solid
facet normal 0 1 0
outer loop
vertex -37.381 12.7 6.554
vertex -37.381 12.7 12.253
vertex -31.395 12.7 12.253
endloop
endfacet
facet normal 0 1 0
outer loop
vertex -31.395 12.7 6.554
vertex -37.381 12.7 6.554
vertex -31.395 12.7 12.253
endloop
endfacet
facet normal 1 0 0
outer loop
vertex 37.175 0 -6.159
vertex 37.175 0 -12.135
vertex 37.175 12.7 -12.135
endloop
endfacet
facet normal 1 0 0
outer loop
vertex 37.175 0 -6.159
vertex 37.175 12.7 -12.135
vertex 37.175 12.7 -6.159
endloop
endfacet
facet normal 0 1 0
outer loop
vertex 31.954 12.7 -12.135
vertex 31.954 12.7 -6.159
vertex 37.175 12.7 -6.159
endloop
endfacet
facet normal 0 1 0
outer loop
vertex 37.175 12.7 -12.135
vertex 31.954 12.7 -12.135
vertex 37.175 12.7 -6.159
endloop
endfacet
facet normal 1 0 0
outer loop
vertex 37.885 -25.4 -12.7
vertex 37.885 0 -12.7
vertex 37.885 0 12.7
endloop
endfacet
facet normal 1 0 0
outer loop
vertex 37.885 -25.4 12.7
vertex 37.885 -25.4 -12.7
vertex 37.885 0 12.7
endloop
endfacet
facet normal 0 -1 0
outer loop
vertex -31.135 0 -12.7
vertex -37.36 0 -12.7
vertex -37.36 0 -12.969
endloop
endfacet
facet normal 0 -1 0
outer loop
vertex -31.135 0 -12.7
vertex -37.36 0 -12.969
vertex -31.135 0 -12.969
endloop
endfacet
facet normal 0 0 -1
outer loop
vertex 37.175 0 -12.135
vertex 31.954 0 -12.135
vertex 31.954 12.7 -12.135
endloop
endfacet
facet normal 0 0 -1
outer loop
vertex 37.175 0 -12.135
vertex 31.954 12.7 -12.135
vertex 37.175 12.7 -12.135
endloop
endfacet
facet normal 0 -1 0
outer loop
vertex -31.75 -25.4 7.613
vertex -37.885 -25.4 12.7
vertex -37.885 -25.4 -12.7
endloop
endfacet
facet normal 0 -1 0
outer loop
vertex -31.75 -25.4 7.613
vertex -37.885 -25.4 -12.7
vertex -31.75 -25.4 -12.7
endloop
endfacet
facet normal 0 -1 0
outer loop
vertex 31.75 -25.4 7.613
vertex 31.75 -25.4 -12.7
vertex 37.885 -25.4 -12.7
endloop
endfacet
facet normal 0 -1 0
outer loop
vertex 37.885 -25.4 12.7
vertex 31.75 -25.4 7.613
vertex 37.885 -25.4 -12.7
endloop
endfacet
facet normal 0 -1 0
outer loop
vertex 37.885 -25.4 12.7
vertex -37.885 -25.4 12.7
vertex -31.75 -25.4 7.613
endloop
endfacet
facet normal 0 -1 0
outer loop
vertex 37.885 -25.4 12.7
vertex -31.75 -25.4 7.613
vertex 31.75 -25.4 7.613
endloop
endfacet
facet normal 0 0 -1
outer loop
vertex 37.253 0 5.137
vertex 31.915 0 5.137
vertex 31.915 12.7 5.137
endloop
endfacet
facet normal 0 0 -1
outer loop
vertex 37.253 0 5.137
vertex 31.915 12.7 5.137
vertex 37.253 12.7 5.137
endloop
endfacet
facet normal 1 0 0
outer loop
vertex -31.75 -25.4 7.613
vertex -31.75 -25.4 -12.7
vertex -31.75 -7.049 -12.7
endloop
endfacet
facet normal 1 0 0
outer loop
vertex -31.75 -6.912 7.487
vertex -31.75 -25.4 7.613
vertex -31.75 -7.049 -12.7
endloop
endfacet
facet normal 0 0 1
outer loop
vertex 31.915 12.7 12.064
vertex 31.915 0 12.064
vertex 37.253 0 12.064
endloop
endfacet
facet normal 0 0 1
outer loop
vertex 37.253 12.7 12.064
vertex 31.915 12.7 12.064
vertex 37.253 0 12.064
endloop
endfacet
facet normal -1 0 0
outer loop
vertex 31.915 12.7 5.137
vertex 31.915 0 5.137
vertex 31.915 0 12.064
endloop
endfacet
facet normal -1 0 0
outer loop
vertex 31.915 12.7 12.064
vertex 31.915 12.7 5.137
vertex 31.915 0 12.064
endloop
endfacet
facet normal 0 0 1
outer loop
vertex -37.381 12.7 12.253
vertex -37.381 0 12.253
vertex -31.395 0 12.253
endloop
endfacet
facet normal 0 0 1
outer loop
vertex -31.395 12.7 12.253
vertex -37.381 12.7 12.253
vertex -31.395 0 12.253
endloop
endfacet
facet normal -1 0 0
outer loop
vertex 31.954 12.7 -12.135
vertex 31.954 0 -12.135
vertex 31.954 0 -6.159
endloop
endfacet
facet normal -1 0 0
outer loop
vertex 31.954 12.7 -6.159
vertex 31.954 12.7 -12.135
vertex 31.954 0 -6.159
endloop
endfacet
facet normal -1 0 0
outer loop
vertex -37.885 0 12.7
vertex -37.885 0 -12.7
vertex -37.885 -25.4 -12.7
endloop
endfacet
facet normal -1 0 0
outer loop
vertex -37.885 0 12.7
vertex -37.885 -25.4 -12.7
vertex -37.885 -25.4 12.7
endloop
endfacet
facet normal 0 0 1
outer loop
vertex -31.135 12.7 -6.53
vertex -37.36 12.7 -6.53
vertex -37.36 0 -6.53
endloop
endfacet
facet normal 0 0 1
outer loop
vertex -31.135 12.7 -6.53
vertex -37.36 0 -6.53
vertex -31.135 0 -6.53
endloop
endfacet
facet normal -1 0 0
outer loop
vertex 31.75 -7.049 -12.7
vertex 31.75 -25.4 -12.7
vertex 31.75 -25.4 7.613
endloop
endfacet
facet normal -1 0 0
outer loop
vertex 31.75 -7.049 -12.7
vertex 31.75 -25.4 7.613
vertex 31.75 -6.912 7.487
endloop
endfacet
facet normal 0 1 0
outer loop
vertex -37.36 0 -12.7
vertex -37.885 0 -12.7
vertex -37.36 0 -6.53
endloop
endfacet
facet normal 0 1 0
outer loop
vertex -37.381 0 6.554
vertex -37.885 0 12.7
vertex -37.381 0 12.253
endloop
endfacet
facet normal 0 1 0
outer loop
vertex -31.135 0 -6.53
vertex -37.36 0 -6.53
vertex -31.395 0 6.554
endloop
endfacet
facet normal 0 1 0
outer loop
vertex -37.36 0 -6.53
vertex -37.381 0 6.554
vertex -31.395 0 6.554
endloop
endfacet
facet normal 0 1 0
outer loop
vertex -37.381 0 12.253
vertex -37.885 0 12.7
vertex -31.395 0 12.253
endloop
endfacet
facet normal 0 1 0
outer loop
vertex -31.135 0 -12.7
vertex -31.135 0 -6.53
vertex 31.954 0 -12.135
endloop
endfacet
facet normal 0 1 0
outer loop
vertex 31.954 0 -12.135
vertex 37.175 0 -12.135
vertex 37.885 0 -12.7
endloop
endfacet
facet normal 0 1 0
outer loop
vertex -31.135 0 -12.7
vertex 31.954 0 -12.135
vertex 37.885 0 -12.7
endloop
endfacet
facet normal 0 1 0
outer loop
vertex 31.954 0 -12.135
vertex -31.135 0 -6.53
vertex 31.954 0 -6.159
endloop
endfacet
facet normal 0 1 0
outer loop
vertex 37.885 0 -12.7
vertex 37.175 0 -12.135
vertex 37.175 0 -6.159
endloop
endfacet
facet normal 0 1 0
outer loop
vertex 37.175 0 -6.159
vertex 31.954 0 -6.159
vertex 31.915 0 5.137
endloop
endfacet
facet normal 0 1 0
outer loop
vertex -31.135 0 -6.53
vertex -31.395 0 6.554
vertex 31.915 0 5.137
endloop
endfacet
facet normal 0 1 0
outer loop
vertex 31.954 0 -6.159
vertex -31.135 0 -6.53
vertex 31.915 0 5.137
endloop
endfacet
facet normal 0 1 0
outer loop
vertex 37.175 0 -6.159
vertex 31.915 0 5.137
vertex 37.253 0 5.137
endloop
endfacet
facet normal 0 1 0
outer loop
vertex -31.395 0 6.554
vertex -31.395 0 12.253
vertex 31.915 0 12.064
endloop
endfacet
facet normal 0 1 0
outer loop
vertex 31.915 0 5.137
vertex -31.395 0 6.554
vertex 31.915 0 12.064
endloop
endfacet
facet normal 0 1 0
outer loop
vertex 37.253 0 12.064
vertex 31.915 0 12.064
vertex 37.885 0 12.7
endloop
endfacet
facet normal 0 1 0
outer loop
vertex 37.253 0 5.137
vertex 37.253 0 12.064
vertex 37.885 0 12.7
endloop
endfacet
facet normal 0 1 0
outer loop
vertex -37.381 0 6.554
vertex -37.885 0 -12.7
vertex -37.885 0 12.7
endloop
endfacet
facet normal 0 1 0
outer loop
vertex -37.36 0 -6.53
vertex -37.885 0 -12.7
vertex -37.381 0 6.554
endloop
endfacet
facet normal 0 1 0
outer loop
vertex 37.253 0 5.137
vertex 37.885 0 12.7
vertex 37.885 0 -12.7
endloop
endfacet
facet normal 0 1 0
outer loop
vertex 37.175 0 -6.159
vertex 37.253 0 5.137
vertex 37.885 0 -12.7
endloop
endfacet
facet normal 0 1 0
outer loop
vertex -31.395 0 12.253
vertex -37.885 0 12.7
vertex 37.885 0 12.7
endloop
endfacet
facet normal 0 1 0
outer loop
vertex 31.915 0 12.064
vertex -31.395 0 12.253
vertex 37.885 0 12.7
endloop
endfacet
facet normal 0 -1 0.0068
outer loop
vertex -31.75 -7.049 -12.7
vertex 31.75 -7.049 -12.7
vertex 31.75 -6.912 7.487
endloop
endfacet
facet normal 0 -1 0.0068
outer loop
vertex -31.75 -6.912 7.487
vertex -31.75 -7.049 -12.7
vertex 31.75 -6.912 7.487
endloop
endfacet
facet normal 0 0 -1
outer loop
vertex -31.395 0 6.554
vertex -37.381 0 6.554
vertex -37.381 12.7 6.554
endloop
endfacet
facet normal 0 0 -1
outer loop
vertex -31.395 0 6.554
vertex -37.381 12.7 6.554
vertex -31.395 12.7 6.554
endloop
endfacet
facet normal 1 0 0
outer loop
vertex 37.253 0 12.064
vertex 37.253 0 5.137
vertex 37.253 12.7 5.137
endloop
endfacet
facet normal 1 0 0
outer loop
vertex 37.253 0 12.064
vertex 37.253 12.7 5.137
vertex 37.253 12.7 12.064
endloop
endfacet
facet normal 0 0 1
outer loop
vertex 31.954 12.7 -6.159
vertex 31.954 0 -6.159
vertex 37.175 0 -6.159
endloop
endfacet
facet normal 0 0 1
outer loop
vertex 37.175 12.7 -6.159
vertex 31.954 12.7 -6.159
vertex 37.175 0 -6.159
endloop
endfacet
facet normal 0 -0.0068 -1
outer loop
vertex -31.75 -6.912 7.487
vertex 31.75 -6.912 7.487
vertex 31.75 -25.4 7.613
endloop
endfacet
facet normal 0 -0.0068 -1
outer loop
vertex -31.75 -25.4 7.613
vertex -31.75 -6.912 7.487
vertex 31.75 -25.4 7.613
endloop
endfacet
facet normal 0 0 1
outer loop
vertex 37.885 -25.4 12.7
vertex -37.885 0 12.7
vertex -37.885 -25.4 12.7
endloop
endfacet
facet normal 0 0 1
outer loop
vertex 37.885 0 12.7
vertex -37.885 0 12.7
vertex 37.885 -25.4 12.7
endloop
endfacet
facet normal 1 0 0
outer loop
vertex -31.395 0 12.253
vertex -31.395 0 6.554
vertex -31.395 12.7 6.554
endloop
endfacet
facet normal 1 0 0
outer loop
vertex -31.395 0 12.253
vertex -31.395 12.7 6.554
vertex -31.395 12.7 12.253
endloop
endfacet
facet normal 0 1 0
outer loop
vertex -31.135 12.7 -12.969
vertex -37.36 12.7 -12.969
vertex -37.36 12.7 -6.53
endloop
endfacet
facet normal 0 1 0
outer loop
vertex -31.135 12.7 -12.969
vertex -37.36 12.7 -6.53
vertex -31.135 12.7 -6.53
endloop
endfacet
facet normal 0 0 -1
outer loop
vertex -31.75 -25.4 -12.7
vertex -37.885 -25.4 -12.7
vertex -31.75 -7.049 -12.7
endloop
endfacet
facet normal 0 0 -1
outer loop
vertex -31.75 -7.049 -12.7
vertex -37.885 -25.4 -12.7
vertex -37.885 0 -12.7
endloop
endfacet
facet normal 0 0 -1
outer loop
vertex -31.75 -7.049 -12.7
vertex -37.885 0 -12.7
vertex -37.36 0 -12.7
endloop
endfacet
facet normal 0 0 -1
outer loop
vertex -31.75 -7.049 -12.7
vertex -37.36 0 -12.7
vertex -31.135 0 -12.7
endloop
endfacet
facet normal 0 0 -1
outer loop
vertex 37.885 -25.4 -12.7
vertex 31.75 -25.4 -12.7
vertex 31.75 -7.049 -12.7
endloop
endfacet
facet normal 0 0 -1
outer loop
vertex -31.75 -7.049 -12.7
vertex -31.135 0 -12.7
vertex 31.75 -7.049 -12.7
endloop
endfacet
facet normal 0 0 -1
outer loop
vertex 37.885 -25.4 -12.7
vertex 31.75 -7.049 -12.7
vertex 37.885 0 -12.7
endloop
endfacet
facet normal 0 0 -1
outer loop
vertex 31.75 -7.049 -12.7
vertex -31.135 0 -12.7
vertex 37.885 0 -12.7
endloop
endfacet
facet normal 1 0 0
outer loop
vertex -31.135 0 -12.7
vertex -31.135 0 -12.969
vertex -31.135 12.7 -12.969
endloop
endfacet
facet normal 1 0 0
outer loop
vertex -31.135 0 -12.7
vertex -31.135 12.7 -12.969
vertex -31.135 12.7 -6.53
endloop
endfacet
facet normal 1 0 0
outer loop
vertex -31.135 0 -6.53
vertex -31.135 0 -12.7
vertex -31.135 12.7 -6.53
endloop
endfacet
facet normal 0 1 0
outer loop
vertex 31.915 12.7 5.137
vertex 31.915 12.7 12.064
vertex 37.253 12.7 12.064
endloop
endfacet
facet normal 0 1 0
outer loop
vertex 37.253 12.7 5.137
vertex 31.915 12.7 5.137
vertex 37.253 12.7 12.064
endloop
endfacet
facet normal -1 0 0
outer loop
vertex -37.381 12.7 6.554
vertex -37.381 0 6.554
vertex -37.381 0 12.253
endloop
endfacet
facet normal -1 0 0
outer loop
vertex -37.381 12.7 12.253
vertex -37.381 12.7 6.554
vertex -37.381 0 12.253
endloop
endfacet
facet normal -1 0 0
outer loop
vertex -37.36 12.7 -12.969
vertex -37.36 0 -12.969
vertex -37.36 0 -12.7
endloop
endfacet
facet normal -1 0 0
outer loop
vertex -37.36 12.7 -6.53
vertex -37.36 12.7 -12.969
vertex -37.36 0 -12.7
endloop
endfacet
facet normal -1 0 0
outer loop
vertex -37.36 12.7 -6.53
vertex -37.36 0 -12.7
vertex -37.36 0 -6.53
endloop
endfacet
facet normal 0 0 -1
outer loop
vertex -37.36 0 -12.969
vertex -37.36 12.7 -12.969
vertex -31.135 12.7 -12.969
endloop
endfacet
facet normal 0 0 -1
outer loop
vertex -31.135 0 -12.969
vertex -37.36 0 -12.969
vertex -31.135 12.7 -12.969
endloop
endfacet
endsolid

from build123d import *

# Parameters (mm, degrees)
F0_W     = 75.76968
F0_H     = 25.4
F1_DEPTH = 25.4
F3_DEPTH = 31.75
F4_W     = 5.986491
F4_H     = 5.698793
F4_W_2   = 6.224596
F4_H_2   = 6.43815
F4_W_3   = 5.22054
F4_H_3   = 5.975276
F4_W_4   = 5.337961
F4_H_4   = 6.926889
F5_DEPTH = 12.7


with BuildPart() as f1:
    # F0 (on Front) → F1 (new body)
    with BuildSketch(Plane.XZ):
        Rectangle(F0_W, F0_H)
    extrude(amount=F1_DEPTH)

    # F2 (on Right) → F3 (cut, symmetric)
    with BuildSketch(Plane.YZ):
        Polygon((-6.912117, 7.487419), (-35.072637, 7.678879), (-39.277993, -27.769957), (-7.134533, -25.226125), align=None)
    extrude(amount=F3_DEPTH, both=True, mode=Mode.SUBTRACT)

    # F4 (on Front) → F5 (join)
    with BuildSketch(Plane.XZ):
        with Locations((-34.387763, 9.403795)):
            Rectangle(F4_W, F4_H)
        with Locations((-34.247685, -9.749556)):
            Rectangle(F4_W_2, F4_H_2)
        with Locations((34.564514, -9.146943)):
            Rectangle(F4_W_3, F4_H_3)
        with Locations((34.584024, 8.600718)):
            Rectangle(F4_W_4, F4_H_4)
    extrude(amount=-F5_DEPTH)


solid = f1.part
